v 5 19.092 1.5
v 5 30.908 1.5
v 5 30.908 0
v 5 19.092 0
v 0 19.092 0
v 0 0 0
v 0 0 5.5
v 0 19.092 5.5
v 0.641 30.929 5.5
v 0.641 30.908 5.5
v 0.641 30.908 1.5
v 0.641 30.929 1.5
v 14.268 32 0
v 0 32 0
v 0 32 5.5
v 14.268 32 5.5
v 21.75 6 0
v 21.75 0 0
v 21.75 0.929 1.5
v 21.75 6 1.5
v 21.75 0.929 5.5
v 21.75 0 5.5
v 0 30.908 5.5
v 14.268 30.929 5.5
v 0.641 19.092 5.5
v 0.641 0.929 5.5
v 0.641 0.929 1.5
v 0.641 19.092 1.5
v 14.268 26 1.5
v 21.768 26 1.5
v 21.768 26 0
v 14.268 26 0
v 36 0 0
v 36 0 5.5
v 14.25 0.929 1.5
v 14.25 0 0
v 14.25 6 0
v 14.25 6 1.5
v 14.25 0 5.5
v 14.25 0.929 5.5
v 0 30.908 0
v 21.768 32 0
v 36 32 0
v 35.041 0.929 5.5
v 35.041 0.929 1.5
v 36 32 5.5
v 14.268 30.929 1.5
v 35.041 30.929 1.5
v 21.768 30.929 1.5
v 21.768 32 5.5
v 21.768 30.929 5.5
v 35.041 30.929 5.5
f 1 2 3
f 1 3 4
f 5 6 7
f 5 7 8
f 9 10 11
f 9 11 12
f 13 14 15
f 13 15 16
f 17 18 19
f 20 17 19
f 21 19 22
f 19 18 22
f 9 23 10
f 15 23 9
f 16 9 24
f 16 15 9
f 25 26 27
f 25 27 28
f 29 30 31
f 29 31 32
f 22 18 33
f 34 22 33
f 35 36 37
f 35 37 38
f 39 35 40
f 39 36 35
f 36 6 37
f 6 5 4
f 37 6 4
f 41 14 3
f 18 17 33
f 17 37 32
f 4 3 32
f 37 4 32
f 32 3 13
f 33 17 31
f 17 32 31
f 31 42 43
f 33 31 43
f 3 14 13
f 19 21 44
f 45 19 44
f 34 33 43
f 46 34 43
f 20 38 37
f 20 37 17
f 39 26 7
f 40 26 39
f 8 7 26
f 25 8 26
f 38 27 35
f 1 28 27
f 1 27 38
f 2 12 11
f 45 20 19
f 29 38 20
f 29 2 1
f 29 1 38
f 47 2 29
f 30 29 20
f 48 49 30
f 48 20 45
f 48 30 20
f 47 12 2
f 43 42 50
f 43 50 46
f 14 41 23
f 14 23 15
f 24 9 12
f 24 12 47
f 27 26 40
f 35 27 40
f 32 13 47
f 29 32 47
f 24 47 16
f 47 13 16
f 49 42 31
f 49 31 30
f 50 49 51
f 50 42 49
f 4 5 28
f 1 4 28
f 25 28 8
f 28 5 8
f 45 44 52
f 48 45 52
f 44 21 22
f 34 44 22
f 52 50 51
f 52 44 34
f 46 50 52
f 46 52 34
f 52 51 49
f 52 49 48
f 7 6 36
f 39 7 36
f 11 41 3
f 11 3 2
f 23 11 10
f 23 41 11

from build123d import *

# Parameters (mm, degrees)
SKETCH_W        = 36
SKETCH_H        = 32
PAD_DEPTH       = 5.5
SKETCH001_W     = 34.4
SKETCH001_H     = 30
POCKET_DEPTH    = 4
SKETCH002_W     = 11.815998
SKETCH002_H     = 6.205499
POCKET001_DEPTH = 5
SKETCH003_W     = 7.5
SKETCH003_H     = 9.005811
POCKET002_DEPTH = 6
SKETCH004_W     = 7.5
SKETCH004_H     = 11.328424
POCKET003_DEPTH = 6


with BuildPart() as part:
    # Sketch → Pad (new body)
    with BuildSketch(Plane.XY):
        with Locations((18, 16)):
            Rectangle(SKETCH_W, SKETCH_H)
    extrude(amount=PAD_DEPTH)

    # Sketch001 (on Face6 of Pad) → Pocket (cut)
    with BuildSketch(Plane.XY.offset(5.5)):
        with Locations((17.841014, 15.929226)):
            Rectangle(SKETCH001_W, SKETCH001_H)
    extrude(amount=-POCKET_DEPTH, mode=Mode.SUBTRACT)

    # Sketch002 (on Face2 of Pocket) → Pocket001 (cut)
    with BuildSketch(Plane(origin=(0, 0, 0), x_dir=(0, -1, 0), z_dir=(-1, 0, 0))):
        with Locations((-24.999628, 2.678109)):
            Rectangle(SKETCH002_W, SKETCH002_H)
    extrude(amount=-POCKET001_DEPTH, mode=Mode.SUBTRACT)

    # Sketch003 (on Face1 of Pocket001) → Pocket002 (cut)
    with BuildSketch(Plane.XZ):
        with Locations((18, 2.765324)):
            Rectangle(SKETCH003_W, SKETCH003_H)
    extrude(amount=-POCKET002_DEPTH, mode=Mode.SUBTRACT)

    # Sketch004 (on Face7 of Pocket001) → Pocket003 (cut)
    with BuildSketch(Plane(origin=(0, 32, 0), x_dir=(-1, 0, 0), z_dir=(0, 1, 0))):
        with Locations((-18.017854, 3.606522)):
            Rectangle(SKETCH004_W, SKETCH004_H)
    extrude(amount=-POCKET003_DEPTH, mode=Mode.SUBTRACT)


solid = part.part
